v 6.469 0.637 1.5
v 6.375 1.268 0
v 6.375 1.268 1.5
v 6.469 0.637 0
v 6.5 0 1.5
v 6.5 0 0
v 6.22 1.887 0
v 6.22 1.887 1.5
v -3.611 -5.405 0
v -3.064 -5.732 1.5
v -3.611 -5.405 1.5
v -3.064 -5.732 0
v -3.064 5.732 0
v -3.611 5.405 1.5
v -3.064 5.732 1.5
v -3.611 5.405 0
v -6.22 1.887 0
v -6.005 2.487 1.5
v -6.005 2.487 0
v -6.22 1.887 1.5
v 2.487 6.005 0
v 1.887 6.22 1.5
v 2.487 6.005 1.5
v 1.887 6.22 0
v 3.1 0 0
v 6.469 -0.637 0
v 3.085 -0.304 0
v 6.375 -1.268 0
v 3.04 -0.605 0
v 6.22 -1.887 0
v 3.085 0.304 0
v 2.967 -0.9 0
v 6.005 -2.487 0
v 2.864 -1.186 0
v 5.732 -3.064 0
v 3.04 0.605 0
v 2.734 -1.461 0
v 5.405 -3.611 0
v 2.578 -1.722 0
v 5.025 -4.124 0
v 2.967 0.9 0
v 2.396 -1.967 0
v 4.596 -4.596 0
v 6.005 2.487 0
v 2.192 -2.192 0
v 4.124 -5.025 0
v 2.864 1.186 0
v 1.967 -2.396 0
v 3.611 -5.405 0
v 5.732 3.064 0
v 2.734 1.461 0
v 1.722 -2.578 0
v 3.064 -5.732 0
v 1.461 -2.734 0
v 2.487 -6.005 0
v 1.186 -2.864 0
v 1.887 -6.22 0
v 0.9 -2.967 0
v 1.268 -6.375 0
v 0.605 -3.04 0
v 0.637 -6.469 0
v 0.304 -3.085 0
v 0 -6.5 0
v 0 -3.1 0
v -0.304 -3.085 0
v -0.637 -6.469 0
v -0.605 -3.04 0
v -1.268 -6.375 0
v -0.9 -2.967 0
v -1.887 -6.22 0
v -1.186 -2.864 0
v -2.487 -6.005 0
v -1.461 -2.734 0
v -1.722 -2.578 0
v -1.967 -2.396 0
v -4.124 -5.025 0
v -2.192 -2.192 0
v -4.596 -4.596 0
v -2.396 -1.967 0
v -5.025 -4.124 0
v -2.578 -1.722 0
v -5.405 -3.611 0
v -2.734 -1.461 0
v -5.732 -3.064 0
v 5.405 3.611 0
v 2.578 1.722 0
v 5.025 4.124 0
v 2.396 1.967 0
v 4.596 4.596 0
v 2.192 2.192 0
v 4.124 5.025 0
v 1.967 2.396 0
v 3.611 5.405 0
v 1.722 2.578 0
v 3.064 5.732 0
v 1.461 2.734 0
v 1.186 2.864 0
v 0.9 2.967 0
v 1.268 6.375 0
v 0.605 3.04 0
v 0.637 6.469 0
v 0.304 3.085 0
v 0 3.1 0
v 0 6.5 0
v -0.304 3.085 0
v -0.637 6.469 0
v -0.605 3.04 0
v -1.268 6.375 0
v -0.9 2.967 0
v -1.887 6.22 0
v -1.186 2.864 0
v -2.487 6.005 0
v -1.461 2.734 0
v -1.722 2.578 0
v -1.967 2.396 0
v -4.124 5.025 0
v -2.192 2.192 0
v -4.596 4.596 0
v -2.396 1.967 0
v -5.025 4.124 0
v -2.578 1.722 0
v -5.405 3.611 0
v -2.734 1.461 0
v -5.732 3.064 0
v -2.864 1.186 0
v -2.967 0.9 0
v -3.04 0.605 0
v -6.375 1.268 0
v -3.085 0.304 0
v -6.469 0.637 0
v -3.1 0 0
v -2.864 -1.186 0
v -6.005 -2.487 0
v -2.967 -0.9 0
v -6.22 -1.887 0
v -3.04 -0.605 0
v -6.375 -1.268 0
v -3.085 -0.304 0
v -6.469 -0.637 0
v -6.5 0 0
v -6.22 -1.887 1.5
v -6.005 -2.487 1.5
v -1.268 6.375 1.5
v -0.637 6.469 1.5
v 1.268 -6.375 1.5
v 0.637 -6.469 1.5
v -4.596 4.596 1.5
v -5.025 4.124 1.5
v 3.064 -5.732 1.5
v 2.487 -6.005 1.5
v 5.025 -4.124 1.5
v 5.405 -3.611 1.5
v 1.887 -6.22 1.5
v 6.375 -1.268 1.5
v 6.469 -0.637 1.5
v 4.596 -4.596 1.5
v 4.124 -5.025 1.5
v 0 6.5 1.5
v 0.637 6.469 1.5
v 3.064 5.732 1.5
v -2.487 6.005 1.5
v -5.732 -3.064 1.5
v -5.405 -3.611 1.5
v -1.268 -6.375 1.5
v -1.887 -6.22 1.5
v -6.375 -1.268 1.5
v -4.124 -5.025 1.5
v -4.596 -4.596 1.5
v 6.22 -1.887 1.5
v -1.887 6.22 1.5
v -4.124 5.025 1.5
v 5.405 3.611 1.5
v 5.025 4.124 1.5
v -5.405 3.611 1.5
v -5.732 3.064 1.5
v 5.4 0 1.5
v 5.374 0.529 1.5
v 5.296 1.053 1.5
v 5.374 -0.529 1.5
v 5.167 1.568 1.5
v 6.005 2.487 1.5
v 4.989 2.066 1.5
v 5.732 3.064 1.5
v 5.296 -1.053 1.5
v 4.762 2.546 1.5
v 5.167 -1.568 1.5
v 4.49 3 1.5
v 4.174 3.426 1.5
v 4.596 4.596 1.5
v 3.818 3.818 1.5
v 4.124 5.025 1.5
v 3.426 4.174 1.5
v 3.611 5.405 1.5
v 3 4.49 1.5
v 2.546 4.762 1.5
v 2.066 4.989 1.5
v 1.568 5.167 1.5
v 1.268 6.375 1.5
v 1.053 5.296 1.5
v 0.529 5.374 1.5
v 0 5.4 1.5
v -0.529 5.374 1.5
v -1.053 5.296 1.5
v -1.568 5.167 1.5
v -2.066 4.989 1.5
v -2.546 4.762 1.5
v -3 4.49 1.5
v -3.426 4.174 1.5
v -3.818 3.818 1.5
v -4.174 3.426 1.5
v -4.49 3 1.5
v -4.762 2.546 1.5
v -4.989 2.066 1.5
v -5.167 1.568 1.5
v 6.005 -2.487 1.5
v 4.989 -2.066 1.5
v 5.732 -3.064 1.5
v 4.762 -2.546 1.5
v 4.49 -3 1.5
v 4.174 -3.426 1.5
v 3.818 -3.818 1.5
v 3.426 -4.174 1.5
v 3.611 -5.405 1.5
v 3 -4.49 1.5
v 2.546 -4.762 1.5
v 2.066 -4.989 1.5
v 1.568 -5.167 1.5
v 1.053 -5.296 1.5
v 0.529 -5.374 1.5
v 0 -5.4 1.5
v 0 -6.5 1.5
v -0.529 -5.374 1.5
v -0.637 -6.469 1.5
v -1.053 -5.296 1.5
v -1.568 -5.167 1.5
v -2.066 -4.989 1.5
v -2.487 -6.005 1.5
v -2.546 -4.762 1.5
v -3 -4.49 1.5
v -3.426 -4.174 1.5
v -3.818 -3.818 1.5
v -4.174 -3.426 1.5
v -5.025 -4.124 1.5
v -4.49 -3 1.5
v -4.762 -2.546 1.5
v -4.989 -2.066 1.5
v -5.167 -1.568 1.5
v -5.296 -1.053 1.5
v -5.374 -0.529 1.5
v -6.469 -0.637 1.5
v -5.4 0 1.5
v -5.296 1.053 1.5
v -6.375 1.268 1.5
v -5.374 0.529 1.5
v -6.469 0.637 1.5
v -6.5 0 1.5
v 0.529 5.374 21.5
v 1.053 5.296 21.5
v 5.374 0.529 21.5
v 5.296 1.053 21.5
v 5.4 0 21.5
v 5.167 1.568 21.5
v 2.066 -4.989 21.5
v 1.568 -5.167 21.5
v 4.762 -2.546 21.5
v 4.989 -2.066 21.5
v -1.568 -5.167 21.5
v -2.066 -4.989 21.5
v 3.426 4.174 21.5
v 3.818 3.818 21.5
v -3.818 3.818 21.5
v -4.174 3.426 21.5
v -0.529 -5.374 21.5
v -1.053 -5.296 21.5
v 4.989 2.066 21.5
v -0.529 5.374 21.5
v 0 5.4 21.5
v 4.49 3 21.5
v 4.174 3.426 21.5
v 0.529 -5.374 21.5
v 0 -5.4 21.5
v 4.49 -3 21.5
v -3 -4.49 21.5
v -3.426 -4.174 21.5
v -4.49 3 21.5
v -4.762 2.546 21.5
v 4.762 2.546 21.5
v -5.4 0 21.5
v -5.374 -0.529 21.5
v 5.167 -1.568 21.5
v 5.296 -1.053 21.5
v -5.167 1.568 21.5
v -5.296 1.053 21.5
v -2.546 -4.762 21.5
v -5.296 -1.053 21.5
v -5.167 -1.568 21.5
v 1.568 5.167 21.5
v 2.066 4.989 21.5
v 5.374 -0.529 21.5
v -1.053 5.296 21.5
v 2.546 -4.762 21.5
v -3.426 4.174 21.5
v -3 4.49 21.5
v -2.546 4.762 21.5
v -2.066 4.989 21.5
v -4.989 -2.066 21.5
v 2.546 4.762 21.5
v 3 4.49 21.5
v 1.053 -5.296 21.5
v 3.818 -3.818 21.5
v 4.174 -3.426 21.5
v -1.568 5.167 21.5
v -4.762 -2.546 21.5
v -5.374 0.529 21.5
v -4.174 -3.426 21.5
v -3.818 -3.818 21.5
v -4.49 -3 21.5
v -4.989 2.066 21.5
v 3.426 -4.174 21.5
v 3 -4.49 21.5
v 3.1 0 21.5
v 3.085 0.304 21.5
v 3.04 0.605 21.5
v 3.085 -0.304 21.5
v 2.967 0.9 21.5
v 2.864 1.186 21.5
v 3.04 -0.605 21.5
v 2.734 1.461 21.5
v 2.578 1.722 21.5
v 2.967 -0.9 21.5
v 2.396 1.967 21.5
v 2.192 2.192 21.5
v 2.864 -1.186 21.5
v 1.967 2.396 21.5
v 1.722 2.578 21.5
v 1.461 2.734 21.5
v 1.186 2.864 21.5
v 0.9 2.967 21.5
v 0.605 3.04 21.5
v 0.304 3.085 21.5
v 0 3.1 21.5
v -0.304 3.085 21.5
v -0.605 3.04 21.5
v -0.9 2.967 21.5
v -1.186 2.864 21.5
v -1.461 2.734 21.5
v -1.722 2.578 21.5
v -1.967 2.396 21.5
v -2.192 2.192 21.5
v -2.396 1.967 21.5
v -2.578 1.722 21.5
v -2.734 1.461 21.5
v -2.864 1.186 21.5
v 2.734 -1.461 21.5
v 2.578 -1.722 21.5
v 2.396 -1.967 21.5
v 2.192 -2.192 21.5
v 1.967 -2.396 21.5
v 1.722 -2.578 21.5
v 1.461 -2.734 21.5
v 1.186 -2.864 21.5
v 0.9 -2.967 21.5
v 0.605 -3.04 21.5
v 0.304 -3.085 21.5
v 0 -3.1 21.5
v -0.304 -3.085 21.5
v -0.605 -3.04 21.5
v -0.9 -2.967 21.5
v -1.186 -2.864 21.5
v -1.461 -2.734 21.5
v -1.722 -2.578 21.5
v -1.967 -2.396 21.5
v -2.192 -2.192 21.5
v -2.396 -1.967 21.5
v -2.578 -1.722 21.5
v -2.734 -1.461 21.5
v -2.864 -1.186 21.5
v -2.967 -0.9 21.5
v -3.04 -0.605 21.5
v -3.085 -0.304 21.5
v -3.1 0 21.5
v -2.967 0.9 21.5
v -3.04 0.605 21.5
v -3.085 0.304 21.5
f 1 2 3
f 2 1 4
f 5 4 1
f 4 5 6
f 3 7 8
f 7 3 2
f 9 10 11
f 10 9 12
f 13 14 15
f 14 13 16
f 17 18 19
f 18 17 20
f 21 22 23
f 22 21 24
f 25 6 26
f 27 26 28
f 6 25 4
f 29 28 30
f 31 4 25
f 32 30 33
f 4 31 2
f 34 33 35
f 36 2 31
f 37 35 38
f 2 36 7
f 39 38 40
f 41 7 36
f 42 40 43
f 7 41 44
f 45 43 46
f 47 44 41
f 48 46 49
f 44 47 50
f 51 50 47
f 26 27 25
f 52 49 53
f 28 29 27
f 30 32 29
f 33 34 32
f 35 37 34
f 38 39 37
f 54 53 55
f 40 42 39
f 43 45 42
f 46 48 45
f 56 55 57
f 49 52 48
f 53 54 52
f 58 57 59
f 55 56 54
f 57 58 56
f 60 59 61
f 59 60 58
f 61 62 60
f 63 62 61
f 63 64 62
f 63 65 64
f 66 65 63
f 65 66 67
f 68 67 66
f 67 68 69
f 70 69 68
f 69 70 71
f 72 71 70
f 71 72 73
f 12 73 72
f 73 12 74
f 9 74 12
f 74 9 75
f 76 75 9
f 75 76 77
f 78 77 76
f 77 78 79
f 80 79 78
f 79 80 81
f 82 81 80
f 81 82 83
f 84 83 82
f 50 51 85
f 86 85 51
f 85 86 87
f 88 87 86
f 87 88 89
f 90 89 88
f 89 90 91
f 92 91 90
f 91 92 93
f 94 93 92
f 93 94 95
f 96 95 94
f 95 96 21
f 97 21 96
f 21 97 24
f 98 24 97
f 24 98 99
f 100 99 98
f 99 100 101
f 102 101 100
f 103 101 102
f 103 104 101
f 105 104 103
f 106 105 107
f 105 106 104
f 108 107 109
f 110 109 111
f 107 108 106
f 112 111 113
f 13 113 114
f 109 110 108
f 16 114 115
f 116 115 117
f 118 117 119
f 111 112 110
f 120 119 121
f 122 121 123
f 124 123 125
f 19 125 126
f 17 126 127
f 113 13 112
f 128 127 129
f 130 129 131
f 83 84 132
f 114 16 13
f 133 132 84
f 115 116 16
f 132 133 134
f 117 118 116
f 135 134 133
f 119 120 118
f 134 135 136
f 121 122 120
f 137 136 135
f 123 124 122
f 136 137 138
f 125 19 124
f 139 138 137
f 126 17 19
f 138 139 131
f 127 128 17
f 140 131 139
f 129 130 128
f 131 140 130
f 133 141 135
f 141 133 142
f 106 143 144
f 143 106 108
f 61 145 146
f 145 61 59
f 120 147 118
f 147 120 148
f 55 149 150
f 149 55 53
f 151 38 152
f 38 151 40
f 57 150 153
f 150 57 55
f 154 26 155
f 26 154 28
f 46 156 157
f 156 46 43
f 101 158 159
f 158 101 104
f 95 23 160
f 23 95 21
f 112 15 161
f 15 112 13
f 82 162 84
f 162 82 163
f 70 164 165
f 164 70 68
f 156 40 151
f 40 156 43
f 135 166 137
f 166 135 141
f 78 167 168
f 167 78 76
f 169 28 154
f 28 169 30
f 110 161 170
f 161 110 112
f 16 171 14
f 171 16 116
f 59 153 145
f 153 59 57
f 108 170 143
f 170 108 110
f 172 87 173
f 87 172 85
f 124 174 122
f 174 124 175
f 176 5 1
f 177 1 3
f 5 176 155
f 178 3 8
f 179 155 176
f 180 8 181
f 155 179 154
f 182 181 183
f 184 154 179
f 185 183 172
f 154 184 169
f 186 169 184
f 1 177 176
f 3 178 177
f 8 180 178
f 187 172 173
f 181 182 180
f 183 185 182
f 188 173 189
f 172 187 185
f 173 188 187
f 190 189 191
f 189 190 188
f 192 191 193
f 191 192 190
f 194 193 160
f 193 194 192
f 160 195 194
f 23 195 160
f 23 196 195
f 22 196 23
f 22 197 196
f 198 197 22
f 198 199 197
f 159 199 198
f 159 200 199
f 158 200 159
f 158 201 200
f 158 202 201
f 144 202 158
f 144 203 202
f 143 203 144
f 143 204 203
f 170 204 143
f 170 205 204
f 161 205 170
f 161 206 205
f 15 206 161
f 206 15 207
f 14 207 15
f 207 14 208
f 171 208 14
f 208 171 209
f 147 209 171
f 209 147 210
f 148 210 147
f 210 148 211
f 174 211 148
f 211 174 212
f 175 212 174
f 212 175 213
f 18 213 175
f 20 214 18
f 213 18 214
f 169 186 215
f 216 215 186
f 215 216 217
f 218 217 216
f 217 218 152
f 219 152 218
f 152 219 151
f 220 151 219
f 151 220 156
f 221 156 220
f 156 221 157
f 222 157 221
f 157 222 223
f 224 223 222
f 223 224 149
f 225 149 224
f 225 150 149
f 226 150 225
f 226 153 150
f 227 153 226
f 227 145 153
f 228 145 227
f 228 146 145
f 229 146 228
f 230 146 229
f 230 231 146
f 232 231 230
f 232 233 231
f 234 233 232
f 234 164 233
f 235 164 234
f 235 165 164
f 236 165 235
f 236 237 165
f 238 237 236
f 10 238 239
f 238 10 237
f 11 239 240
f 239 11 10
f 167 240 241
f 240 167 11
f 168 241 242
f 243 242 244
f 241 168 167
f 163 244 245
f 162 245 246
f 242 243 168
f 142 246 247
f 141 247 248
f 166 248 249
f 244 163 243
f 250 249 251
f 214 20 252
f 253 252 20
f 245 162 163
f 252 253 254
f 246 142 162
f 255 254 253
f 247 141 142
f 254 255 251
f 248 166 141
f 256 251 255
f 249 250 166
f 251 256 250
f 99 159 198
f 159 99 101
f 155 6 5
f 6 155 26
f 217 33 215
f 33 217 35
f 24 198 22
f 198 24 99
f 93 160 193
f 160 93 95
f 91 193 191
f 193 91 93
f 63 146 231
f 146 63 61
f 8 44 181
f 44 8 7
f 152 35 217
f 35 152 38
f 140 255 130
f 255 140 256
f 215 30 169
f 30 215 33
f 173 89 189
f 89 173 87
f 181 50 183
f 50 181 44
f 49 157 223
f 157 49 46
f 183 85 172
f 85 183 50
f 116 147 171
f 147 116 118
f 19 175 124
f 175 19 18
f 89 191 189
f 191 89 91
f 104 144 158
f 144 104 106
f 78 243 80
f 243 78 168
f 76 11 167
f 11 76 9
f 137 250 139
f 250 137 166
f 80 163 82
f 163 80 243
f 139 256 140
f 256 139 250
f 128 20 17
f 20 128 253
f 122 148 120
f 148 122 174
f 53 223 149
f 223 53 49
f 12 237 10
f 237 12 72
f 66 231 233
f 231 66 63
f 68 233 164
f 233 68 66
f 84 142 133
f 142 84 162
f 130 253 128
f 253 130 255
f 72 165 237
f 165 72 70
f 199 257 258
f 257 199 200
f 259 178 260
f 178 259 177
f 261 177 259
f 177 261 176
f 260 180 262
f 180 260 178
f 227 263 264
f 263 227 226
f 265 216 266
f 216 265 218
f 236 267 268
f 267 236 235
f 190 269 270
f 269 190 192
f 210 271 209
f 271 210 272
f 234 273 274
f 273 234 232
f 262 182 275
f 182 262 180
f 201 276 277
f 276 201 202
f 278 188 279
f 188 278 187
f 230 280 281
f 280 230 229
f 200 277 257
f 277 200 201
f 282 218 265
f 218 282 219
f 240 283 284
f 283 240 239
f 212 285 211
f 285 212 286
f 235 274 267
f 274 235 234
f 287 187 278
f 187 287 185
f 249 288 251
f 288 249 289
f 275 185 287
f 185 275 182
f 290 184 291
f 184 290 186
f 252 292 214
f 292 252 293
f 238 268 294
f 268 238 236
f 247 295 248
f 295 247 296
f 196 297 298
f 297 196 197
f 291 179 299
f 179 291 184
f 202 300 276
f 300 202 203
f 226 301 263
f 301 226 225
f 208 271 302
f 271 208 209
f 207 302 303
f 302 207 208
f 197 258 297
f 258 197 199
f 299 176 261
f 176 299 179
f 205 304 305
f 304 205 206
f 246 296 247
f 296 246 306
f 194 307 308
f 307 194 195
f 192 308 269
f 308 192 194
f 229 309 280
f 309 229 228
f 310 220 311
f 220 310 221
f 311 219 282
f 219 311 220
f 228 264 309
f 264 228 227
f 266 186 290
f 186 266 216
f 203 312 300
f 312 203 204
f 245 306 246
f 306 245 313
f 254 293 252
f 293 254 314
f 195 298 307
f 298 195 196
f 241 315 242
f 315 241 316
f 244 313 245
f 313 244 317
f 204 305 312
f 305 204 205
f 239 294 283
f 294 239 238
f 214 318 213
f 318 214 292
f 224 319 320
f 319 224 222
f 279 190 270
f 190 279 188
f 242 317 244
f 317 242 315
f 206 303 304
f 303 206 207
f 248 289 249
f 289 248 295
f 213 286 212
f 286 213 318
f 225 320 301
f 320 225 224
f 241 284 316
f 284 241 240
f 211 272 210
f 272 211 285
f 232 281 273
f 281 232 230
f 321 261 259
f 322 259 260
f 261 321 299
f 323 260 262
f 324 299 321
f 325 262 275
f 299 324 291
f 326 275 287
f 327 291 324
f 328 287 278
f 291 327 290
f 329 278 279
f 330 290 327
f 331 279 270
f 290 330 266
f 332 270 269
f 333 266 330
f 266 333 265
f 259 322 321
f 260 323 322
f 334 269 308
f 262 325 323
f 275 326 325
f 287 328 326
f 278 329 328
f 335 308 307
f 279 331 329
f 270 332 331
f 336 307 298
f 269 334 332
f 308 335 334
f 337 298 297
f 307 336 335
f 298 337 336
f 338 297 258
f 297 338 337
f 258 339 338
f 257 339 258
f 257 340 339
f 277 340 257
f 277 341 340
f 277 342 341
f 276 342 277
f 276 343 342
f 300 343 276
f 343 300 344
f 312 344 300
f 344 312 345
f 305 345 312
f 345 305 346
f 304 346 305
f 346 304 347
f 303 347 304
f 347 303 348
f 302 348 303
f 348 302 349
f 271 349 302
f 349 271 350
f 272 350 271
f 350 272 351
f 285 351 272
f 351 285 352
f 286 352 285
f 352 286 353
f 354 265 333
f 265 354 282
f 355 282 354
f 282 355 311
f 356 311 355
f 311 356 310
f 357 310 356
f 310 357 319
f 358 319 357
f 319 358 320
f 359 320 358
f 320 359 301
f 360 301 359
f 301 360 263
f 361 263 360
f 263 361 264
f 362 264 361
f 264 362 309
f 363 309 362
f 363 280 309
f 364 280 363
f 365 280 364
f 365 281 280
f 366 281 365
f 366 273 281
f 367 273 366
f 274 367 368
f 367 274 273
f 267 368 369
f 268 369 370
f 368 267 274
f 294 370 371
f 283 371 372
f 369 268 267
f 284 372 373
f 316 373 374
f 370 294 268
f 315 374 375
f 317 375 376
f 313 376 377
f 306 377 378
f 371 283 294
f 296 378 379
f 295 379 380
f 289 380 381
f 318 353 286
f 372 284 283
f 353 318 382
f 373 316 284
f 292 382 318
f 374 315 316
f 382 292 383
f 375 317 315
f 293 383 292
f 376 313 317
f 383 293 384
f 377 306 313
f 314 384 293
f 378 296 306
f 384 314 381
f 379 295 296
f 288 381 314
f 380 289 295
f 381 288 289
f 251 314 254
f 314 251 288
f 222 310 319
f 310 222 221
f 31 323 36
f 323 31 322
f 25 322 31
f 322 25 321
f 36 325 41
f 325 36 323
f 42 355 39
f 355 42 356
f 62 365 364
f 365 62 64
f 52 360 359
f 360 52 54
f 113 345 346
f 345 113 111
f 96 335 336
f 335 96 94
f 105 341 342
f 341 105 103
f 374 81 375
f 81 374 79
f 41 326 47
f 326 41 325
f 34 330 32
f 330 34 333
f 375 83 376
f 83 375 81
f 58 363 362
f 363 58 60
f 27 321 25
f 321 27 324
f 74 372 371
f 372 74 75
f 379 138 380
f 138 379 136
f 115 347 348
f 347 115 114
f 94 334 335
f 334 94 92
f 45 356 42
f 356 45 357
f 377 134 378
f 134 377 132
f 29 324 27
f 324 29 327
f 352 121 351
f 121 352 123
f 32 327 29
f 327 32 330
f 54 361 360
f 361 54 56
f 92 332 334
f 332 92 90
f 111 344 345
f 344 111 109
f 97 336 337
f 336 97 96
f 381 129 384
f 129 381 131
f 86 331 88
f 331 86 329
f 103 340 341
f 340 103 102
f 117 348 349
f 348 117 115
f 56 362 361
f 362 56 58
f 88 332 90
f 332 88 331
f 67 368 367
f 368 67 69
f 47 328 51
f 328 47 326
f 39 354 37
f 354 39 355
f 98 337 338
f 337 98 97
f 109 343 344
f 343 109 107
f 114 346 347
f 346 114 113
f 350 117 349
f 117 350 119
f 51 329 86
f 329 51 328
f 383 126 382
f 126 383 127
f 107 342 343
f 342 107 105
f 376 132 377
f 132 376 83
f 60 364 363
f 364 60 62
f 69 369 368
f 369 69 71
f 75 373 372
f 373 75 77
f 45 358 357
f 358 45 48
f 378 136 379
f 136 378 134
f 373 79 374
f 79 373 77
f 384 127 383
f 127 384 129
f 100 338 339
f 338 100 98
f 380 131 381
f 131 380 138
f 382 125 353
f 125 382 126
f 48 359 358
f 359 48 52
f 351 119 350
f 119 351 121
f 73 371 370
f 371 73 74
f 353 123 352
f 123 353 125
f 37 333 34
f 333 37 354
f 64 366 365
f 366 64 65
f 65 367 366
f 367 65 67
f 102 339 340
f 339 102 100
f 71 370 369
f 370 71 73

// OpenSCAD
// Parameters (mm)
collar_diameter = 13;          // Diameter of the bottom collar
collar_thickness = 1.5;        // Thickness of the bottom collar (z = 0 → 1.5)
sleeve_outer_diameter = 10.8; // Outer diameter of the sleeve body
sleeve_total_height = 21.5;    // Total height from bed to top of sleeve
bore_diameter = 6.2;           // Diameter of the straight bore

// Derived dimensions
sleeve_body_height = sleeve_total_height - collar_thickness; // Height of the sleeve body alone

// Global resolution for curved shapes
$fn = 64;

// Main model
difference() {
    // Union of collar and sleeve body
    union() {
        // Bottom collar (rests on the bed)
        cylinder(d = collar_diameter,
                 h = collar_thickness,
                 center = false);
        
        // Sleeve body (overlaps collar by 0.01 mm to avoid coplanar faces)
        translate([0, 0, collar_thickness - 0.01])
            cylinder(d = sleeve_outer_diameter,
                     h = sleeve_body_height + 0.01,
                     center = false);
    }
    
    // Straight bore through the entire part (extends 0.01 mm beyond each end)
    translate([0, 0, -0.01])
        cylinder(d = bore_diameter,
                 h = sleeve_total_height + 0.02,
                 center = false);
}
